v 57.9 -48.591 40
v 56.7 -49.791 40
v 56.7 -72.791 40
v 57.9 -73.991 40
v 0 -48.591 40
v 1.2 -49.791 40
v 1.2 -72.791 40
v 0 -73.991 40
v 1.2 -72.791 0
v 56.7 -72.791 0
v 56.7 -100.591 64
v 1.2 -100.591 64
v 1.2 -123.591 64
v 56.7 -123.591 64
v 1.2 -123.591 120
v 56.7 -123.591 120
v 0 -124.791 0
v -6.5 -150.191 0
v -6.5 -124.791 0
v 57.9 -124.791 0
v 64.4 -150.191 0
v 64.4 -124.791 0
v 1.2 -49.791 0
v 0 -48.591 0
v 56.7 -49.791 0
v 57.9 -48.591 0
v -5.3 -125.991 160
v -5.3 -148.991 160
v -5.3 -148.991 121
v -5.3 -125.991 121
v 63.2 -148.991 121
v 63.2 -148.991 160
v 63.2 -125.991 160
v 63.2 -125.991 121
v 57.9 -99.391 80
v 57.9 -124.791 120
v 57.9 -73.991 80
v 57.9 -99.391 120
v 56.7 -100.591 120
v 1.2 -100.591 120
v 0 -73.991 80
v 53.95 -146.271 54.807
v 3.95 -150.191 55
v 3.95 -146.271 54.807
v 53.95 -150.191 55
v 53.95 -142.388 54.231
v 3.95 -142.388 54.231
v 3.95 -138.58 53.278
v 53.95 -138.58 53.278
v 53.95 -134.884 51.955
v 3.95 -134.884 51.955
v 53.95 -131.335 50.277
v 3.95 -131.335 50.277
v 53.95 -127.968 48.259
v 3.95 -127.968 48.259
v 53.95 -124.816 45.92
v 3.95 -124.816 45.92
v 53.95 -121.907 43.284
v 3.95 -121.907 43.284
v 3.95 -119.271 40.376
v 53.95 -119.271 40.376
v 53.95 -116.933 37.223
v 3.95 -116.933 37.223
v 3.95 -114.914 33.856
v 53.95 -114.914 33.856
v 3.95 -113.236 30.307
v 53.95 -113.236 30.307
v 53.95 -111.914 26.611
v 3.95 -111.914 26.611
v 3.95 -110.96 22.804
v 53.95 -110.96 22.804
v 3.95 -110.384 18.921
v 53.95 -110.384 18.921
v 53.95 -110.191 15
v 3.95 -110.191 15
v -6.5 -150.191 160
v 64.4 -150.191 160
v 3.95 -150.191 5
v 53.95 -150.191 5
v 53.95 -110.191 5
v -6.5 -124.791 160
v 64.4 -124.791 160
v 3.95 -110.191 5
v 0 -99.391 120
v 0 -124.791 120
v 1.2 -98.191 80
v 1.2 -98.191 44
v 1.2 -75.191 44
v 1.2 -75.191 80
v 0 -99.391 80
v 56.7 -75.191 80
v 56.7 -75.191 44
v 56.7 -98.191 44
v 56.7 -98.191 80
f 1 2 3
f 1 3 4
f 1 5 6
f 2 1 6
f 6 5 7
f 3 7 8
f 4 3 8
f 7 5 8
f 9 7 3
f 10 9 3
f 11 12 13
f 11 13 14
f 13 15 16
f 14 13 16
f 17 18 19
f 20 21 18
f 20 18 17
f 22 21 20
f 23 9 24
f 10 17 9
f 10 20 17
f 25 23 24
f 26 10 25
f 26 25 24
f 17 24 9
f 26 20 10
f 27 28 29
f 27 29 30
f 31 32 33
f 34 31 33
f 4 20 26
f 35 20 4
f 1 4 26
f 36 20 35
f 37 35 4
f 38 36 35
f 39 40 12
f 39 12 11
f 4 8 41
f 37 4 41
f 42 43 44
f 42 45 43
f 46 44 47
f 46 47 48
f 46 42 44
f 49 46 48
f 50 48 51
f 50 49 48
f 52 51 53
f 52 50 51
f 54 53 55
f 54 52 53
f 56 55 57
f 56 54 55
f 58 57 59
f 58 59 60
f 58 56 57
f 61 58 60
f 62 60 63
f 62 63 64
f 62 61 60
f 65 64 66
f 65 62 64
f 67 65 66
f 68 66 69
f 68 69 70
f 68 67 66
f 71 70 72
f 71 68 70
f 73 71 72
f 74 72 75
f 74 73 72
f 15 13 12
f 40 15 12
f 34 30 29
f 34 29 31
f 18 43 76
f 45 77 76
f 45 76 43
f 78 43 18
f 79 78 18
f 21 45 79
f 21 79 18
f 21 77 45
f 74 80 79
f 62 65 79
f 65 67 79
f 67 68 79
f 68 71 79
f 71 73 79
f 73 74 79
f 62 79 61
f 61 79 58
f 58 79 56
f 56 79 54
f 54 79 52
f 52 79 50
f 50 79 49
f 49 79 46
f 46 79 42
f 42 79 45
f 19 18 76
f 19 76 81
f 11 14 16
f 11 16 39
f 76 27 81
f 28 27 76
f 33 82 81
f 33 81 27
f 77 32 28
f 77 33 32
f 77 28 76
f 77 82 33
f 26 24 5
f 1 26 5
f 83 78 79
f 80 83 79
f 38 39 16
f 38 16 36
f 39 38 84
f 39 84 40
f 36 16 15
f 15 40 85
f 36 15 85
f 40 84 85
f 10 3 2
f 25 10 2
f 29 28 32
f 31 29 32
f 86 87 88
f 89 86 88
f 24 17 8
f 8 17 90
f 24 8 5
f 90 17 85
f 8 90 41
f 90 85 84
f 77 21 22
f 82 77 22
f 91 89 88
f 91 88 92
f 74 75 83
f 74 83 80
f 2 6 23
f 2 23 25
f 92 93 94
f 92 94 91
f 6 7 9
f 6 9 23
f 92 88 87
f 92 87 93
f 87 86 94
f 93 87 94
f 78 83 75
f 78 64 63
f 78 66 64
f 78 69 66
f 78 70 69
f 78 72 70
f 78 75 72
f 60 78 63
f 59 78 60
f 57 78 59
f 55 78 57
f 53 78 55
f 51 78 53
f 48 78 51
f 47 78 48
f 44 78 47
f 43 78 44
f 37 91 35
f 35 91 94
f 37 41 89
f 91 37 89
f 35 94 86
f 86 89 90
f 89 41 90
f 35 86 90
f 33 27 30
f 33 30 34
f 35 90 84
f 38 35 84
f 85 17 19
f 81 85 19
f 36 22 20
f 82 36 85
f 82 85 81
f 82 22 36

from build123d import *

# Parameters (mm, degrees)
F1_DEPTH      = 57.9
F2_DEPTH      = 64.4
F2_DEPTH_BACK = 6.5
F3_W          = 55.5
F3_H          = 23
F4_DEPTH      = 207
F5_DEPTH      = 116
F6_DEPTH      = 96
F3_W_2        = 68.5
F7_DEPTH      = 39
F8_W          = 50
F8_H          = 50
F9_DEPTH      = 40
F10_R         = 39.99999


# Not quite as in the source:
# - a fillet or chamfer is up to 0.001 mm smaller than in the source, because OpenCascade refuses the exact size


with BuildPart() as f1:
    # F0 (on Right) → F1 (new body)
    with BuildSketch(Plane.YZ):
        Polygon((-124.7912996866, 120), (-124.7912996866, 0), (-48.5912996866, 0), (-48.5912996866, 40), (-73.9912996866, 40), (-73.9912996866, 80), (-99.3912996866, 80), (-99.3912996866, 120), align=None)
    extrude(amount=F1_DEPTH)

    # F0 (on Right) → F2 (join, two sides)
    with BuildSketch(Plane.YZ) as f2_sk:
        Polygon((-150.1912996866, 160), (-150.1912996866, 0), (-124.7912996866, 0), (-124.7912996866, 120), (-124.7912996866, 160), align=None)
    extrude(amount=F2_DEPTH)
    extrude(f2_sk.sketch, amount=-F2_DEPTH_BACK)

    # F3 (on face) → F4 (cut)
    with BuildSketch(Plane.XY.offset(160)):
        with Locations((28.95, -61.2912996866)):
            Rectangle(F3_W, F3_H)
    extrude(amount=-F4_DEPTH, mode=Mode.SUBTRACT)

    # F3 (on face) → F5 (cut, through all)
    with BuildSketch(Plane.XY.offset(160)):
        with Locations((28.95, -86.6912996866)):
            Rectangle(F3_W, F3_H)
    extrude(amount=-F5_DEPTH, mode=Mode.SUBTRACT)

    # F3 (on face) → F6 (cut, through all)
    with BuildSketch(Plane.XY.offset(160)):
        with Locations((28.95, -112.0912996866)):
            Rectangle(F3_W, F3_H)
    extrude(amount=-F6_DEPTH, mode=Mode.SUBTRACT)

    # F3 (on face) → F7 (cut)
    with BuildSketch(Plane.XY.offset(160)):
        with Locations((28.95, -137.4912996866)):
            Rectangle(F3_W_2, F3_H)
    extrude(amount=-F7_DEPTH, mode=Mode.SUBTRACT)

    # F8 (on face) → F9 (cut)
    with BuildSketch(Plane.XZ.offset(150.1912996866)):
        with Locations((28.95, 30)):
            Rectangle(F8_W, F8_H)
    extrude(amount=-F9_DEPTH, mode=Mode.SUBTRACT)

    # F10 (radius 40 in the source; OpenCascade refuses exactly that, so slightly less here)
    f10_edges = [f1.edges().sort_by_distance(p)[0] for p in [
        (28.95, -110.1913, 55),
    ]]
    fillet(f10_edges, radius=F10_R)


solid = f1.part
